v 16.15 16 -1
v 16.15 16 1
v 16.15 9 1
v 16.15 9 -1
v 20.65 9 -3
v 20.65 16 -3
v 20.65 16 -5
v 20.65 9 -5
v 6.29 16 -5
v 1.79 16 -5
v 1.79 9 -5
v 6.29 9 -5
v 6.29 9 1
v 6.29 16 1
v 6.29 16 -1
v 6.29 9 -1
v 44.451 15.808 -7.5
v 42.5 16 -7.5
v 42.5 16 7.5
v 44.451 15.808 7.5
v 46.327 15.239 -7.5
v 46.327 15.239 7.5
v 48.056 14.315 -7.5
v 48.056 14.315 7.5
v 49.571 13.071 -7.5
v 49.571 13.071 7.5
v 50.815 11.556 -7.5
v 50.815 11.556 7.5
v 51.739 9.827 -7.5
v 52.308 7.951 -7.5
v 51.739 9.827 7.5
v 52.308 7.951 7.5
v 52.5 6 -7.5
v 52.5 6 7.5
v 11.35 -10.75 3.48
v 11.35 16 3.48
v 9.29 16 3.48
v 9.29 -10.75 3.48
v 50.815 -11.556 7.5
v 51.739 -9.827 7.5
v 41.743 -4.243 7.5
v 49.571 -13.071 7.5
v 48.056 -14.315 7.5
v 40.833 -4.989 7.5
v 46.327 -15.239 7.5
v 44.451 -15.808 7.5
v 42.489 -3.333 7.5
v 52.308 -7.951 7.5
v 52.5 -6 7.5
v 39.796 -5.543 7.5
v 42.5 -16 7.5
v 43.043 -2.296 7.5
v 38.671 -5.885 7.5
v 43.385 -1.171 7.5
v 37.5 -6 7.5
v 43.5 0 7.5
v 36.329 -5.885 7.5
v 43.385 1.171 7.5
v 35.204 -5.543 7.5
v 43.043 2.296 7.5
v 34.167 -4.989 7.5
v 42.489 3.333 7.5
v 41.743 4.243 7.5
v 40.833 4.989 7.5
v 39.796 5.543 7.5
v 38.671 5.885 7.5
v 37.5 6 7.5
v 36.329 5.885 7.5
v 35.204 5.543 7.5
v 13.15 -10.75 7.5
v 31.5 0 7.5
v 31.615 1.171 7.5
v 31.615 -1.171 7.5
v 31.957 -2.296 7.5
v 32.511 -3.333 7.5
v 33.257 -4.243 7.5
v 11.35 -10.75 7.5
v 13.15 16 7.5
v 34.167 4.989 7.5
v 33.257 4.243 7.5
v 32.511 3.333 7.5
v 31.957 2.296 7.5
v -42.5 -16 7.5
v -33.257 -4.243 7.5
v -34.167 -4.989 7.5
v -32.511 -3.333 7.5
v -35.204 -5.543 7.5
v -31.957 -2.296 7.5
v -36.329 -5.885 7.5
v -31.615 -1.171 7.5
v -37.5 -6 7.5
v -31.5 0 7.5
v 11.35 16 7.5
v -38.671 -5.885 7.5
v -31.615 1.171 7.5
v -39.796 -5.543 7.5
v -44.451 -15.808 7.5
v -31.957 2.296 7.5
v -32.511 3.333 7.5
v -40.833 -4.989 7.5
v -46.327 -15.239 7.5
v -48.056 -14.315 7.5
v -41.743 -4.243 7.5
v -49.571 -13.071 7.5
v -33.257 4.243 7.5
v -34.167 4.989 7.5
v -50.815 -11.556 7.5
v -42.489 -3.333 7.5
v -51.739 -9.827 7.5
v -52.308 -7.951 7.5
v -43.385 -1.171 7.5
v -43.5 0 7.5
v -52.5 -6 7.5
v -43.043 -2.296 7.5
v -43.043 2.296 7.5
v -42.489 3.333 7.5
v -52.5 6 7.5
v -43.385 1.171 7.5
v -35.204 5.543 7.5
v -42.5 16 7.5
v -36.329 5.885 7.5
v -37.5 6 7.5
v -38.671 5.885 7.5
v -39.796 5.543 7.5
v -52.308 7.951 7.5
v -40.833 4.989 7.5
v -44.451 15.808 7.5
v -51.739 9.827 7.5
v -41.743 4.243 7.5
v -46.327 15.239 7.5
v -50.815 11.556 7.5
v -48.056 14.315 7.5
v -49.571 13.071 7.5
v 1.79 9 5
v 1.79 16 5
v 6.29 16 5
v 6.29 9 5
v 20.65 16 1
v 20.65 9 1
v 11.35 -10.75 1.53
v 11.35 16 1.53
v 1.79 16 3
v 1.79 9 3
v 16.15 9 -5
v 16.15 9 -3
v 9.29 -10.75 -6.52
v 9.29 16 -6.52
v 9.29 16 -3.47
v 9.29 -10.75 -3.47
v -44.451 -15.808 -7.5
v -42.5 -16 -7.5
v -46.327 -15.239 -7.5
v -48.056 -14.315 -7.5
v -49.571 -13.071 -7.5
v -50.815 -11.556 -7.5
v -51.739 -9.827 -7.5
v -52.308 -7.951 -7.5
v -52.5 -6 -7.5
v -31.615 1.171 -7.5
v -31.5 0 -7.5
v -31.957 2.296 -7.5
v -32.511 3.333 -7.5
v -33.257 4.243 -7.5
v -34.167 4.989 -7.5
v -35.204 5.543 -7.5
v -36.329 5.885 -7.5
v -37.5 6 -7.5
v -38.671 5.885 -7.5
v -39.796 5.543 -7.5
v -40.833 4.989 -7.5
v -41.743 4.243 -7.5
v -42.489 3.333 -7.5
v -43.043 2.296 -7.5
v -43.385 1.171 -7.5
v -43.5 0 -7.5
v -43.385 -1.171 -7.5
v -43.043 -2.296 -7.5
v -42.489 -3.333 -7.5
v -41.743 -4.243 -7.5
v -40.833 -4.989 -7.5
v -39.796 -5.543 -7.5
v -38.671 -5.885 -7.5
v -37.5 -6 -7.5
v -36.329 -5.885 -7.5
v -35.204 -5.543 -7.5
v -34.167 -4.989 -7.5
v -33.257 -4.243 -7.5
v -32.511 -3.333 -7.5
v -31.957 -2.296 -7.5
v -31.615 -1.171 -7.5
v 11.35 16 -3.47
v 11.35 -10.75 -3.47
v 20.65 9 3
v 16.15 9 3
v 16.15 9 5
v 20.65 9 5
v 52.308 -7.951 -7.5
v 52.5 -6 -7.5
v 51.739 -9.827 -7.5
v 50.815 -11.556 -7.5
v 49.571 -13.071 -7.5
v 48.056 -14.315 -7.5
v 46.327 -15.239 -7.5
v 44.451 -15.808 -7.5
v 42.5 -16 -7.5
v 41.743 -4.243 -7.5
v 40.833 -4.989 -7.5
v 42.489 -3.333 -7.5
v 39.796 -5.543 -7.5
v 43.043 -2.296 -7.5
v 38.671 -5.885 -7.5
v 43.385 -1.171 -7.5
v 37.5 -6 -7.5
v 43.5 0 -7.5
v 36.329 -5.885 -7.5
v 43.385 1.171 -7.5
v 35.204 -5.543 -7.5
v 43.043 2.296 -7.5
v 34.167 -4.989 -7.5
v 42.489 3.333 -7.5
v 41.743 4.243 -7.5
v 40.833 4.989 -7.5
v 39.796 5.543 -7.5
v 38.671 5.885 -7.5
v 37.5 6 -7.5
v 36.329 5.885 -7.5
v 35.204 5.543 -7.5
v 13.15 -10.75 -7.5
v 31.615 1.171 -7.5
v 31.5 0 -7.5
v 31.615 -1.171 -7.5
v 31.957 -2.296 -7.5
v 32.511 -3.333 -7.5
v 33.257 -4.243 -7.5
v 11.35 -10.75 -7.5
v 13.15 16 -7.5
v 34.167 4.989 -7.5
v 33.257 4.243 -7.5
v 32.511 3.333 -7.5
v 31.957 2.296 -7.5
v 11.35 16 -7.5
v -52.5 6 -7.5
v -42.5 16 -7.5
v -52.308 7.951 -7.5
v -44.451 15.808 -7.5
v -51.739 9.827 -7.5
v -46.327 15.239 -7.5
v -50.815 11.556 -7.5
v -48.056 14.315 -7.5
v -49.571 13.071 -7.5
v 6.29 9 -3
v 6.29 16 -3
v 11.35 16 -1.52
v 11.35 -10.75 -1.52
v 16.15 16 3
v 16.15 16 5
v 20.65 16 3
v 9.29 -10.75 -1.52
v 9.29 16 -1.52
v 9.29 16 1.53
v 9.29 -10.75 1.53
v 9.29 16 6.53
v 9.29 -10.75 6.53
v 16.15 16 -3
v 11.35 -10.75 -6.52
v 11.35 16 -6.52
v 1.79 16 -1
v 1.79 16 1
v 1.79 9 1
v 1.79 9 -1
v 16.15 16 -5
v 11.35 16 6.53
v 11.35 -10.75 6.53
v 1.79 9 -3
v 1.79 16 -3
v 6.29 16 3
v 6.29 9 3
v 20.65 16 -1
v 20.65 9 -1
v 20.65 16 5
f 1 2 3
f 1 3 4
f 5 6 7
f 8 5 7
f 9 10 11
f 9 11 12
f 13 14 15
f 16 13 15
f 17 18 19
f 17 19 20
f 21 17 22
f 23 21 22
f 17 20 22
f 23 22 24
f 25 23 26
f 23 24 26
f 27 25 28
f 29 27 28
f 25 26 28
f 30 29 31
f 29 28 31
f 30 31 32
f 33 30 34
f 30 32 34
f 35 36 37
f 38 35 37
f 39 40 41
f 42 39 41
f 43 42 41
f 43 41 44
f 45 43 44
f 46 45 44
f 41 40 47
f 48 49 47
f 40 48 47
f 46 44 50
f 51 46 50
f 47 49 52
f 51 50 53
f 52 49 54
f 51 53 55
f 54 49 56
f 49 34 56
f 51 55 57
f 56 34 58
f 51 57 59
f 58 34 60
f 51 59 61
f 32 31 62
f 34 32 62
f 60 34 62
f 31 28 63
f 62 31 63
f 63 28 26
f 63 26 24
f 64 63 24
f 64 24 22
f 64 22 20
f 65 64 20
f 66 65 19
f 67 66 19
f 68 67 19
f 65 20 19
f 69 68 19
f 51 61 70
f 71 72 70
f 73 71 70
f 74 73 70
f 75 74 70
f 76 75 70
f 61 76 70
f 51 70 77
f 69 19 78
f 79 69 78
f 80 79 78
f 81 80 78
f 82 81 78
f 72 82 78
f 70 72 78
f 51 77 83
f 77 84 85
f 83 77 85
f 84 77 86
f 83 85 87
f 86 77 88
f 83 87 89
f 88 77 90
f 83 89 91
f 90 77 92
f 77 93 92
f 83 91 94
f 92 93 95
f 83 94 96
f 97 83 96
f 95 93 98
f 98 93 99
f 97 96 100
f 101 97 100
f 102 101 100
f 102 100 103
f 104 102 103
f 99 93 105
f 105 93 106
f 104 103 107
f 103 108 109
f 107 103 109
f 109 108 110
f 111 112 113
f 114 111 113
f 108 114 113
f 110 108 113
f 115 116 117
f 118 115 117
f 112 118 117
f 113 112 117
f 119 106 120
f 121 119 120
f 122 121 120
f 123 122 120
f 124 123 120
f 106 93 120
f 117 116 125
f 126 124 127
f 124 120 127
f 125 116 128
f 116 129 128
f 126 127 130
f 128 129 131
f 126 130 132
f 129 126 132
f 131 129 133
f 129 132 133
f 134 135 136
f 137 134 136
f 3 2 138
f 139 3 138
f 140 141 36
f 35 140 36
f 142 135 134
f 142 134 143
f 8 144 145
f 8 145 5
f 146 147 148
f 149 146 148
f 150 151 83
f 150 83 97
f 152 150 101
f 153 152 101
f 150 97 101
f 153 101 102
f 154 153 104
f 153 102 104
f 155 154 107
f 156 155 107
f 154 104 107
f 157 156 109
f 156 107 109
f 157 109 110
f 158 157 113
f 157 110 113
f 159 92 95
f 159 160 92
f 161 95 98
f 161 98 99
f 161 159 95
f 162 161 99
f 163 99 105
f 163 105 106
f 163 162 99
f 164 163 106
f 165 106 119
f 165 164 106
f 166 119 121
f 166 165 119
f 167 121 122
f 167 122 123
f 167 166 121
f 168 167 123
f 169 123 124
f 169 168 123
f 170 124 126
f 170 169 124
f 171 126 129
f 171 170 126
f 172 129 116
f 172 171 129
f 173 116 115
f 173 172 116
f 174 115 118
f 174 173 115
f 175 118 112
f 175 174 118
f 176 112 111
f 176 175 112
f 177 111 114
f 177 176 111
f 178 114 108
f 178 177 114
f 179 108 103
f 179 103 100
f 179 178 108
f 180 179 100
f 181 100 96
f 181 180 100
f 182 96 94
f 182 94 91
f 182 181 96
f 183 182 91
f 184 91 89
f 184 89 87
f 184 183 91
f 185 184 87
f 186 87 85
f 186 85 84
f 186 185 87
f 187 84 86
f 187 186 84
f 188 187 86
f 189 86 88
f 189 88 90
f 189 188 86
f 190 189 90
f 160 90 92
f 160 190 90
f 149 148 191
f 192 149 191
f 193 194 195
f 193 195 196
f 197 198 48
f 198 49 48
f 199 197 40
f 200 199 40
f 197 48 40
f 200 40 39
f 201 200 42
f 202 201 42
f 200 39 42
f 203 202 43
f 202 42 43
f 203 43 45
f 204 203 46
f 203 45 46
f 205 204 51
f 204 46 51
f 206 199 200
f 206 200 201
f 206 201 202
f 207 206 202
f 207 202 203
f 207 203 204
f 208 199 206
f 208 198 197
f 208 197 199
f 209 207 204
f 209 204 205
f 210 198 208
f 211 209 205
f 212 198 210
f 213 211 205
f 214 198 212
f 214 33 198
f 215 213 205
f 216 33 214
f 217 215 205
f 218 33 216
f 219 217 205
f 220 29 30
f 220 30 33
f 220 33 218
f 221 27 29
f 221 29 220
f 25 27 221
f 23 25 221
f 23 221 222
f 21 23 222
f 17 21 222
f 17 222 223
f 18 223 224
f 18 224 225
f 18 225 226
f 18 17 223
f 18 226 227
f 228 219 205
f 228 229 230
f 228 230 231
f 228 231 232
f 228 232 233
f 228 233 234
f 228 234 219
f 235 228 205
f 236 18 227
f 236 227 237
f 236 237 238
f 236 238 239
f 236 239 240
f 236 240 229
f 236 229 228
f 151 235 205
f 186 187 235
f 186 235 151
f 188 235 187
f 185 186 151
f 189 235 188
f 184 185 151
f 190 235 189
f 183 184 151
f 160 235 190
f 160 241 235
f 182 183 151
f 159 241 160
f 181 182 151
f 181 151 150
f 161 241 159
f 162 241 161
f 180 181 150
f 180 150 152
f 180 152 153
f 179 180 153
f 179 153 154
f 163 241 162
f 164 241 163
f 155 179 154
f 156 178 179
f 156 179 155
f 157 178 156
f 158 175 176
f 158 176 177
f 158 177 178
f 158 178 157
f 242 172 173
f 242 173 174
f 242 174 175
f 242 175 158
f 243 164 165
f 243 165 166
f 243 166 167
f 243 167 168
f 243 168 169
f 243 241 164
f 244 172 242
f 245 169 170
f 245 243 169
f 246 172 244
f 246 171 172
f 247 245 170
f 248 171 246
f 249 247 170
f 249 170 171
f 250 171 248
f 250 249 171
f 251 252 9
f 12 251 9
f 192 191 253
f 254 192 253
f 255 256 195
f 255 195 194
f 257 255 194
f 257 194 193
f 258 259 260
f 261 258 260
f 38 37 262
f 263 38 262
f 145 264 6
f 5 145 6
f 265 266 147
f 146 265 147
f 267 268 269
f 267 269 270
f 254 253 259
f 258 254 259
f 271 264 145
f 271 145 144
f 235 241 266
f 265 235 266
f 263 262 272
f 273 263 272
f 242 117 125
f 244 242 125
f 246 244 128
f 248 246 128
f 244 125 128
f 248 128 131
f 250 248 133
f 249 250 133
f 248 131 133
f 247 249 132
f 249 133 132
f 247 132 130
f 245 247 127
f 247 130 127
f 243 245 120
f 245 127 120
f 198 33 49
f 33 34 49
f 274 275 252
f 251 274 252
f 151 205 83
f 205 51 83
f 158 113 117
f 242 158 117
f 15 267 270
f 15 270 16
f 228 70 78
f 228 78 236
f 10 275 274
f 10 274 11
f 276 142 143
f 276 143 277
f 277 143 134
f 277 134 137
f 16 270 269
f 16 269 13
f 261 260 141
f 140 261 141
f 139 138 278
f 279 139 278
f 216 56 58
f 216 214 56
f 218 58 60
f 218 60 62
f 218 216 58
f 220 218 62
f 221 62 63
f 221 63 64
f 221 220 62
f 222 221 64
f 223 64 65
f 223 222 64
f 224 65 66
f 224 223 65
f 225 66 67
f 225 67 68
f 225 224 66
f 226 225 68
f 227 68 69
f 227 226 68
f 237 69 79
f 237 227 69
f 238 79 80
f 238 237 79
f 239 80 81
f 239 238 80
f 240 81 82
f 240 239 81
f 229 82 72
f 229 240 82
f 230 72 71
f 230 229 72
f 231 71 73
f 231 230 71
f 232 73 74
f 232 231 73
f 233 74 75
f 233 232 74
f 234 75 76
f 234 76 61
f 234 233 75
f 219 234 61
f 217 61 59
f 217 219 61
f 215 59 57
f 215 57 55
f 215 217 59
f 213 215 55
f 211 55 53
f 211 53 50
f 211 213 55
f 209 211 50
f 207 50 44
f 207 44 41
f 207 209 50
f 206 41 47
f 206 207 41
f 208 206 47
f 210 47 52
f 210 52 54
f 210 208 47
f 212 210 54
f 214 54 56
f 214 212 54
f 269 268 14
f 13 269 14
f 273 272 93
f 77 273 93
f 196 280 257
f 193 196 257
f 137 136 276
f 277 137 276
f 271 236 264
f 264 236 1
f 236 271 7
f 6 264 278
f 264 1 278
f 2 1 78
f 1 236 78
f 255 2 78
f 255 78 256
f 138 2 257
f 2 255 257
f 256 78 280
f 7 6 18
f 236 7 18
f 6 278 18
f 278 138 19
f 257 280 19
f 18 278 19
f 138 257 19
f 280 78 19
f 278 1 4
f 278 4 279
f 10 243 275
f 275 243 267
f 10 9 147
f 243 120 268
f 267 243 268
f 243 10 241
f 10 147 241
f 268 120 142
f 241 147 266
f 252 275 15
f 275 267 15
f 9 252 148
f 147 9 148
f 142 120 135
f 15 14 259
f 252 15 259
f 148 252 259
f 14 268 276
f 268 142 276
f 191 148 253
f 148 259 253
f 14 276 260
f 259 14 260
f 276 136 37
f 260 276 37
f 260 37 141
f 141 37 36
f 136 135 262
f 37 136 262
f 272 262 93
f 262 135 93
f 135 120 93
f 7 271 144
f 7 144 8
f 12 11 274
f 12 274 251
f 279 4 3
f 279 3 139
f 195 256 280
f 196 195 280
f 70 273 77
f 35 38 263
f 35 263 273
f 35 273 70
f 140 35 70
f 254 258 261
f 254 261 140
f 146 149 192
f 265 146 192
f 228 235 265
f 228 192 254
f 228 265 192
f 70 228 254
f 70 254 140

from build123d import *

# Parameters (mm, degrees)
SKETCH_1_R          = 6
EXTRUDE_1_DEPTH     = 7.5
CUT_EXTRUDE_1_DEPTH = 26.75
SKETCH_4_W          = 4.5
SKETCH_4_H          = 2
CUT_EXTRUDE_2_DEPTH = 7


with BuildPart() as part:
    # 草图1 → 凸台-拉伸1 (new, symmetric)
    with BuildSketch(Plane.XY):
        with BuildLine():
            Line((-42.5, 16), (42.5, 16))
            ThreePointArc((42.5, 16), (49.571067812, 13.071067812), (52.5, 6))
            Line((52.5, 6), (52.5, -6))
            ThreePointArc((52.5, -6), (49.571067812, -13.071067812), (42.5, -16))
            Line((42.5, -16), (-42.5, -16))
            ThreePointArc((-42.5, -16), (-49.571067812, -13.071067812), (-52.5, -6))
            Line((-52.5, -6), (-52.5, 6))
            ThreePointArc((-52.5, 6), (-49.571067812, 13.071067812), (-42.5, 16))
        make_face()
        with Locations((-37.5, 0)):
            Circle(SKETCH_1_R, mode=Mode.SUBTRACT)
        with Locations((37.5, 0)):
            Circle(SKETCH_1_R, mode=Mode.SUBTRACT)
    extrude(amount=EXTRUDE_1_DEPTH, both=True)

    # 草图2 → 切除-拉伸1 (cut)
    with BuildSketch(Plane(origin=(0, 16, 0), x_dir=(1, 0, 0), z_dir=(0, 1, 0))):
        Polygon((13.15, 7.5), (11.35, 7.5), (11.35, 6.52), (9.29, 6.52), (9.29, 3.47), (11.35, 3.47), (11.35, 1.52), (9.29, 1.52), (9.29, -1.53), (11.35, -1.53), (11.35, -3.48), (9.29, -3.48), (9.29, -6.53), (11.35, -6.53), (11.35, -7.5), (13.15, -7.5), align=None)
    extrude(amount=-CUT_EXTRUDE_1_DEPTH, mode=Mode.SUBTRACT)

    # 草图4 → 切除-拉伸2 (cut)
    with BuildSketch(Plane(origin=(0, 16, 0), x_dir=(1, 0, 0), z_dir=(0, 1, 0))):
        with Locations((4.04, 4)):
            Rectangle(SKETCH_4_W, SKETCH_4_H)
        with Locations((4.04, 0)):
            Rectangle(SKETCH_4_W, SKETCH_4_H)
        with Locations((4.04, -4)):
            Rectangle(SKETCH_4_W, SKETCH_4_H)
        with Locations((18.4, 4)):
            Rectangle(SKETCH_4_W, SKETCH_4_H)
        with Locations((18.4, 0)):
            Rectangle(SKETCH_4_W, SKETCH_4_H)
        with Locations((18.4, -4)):
            Rectangle(SKETCH_4_W, SKETCH_4_H)
    extrude(amount=-CUT_EXTRUDE_2_DEPTH, mode=Mode.SUBTRACT)


solid = part.part
